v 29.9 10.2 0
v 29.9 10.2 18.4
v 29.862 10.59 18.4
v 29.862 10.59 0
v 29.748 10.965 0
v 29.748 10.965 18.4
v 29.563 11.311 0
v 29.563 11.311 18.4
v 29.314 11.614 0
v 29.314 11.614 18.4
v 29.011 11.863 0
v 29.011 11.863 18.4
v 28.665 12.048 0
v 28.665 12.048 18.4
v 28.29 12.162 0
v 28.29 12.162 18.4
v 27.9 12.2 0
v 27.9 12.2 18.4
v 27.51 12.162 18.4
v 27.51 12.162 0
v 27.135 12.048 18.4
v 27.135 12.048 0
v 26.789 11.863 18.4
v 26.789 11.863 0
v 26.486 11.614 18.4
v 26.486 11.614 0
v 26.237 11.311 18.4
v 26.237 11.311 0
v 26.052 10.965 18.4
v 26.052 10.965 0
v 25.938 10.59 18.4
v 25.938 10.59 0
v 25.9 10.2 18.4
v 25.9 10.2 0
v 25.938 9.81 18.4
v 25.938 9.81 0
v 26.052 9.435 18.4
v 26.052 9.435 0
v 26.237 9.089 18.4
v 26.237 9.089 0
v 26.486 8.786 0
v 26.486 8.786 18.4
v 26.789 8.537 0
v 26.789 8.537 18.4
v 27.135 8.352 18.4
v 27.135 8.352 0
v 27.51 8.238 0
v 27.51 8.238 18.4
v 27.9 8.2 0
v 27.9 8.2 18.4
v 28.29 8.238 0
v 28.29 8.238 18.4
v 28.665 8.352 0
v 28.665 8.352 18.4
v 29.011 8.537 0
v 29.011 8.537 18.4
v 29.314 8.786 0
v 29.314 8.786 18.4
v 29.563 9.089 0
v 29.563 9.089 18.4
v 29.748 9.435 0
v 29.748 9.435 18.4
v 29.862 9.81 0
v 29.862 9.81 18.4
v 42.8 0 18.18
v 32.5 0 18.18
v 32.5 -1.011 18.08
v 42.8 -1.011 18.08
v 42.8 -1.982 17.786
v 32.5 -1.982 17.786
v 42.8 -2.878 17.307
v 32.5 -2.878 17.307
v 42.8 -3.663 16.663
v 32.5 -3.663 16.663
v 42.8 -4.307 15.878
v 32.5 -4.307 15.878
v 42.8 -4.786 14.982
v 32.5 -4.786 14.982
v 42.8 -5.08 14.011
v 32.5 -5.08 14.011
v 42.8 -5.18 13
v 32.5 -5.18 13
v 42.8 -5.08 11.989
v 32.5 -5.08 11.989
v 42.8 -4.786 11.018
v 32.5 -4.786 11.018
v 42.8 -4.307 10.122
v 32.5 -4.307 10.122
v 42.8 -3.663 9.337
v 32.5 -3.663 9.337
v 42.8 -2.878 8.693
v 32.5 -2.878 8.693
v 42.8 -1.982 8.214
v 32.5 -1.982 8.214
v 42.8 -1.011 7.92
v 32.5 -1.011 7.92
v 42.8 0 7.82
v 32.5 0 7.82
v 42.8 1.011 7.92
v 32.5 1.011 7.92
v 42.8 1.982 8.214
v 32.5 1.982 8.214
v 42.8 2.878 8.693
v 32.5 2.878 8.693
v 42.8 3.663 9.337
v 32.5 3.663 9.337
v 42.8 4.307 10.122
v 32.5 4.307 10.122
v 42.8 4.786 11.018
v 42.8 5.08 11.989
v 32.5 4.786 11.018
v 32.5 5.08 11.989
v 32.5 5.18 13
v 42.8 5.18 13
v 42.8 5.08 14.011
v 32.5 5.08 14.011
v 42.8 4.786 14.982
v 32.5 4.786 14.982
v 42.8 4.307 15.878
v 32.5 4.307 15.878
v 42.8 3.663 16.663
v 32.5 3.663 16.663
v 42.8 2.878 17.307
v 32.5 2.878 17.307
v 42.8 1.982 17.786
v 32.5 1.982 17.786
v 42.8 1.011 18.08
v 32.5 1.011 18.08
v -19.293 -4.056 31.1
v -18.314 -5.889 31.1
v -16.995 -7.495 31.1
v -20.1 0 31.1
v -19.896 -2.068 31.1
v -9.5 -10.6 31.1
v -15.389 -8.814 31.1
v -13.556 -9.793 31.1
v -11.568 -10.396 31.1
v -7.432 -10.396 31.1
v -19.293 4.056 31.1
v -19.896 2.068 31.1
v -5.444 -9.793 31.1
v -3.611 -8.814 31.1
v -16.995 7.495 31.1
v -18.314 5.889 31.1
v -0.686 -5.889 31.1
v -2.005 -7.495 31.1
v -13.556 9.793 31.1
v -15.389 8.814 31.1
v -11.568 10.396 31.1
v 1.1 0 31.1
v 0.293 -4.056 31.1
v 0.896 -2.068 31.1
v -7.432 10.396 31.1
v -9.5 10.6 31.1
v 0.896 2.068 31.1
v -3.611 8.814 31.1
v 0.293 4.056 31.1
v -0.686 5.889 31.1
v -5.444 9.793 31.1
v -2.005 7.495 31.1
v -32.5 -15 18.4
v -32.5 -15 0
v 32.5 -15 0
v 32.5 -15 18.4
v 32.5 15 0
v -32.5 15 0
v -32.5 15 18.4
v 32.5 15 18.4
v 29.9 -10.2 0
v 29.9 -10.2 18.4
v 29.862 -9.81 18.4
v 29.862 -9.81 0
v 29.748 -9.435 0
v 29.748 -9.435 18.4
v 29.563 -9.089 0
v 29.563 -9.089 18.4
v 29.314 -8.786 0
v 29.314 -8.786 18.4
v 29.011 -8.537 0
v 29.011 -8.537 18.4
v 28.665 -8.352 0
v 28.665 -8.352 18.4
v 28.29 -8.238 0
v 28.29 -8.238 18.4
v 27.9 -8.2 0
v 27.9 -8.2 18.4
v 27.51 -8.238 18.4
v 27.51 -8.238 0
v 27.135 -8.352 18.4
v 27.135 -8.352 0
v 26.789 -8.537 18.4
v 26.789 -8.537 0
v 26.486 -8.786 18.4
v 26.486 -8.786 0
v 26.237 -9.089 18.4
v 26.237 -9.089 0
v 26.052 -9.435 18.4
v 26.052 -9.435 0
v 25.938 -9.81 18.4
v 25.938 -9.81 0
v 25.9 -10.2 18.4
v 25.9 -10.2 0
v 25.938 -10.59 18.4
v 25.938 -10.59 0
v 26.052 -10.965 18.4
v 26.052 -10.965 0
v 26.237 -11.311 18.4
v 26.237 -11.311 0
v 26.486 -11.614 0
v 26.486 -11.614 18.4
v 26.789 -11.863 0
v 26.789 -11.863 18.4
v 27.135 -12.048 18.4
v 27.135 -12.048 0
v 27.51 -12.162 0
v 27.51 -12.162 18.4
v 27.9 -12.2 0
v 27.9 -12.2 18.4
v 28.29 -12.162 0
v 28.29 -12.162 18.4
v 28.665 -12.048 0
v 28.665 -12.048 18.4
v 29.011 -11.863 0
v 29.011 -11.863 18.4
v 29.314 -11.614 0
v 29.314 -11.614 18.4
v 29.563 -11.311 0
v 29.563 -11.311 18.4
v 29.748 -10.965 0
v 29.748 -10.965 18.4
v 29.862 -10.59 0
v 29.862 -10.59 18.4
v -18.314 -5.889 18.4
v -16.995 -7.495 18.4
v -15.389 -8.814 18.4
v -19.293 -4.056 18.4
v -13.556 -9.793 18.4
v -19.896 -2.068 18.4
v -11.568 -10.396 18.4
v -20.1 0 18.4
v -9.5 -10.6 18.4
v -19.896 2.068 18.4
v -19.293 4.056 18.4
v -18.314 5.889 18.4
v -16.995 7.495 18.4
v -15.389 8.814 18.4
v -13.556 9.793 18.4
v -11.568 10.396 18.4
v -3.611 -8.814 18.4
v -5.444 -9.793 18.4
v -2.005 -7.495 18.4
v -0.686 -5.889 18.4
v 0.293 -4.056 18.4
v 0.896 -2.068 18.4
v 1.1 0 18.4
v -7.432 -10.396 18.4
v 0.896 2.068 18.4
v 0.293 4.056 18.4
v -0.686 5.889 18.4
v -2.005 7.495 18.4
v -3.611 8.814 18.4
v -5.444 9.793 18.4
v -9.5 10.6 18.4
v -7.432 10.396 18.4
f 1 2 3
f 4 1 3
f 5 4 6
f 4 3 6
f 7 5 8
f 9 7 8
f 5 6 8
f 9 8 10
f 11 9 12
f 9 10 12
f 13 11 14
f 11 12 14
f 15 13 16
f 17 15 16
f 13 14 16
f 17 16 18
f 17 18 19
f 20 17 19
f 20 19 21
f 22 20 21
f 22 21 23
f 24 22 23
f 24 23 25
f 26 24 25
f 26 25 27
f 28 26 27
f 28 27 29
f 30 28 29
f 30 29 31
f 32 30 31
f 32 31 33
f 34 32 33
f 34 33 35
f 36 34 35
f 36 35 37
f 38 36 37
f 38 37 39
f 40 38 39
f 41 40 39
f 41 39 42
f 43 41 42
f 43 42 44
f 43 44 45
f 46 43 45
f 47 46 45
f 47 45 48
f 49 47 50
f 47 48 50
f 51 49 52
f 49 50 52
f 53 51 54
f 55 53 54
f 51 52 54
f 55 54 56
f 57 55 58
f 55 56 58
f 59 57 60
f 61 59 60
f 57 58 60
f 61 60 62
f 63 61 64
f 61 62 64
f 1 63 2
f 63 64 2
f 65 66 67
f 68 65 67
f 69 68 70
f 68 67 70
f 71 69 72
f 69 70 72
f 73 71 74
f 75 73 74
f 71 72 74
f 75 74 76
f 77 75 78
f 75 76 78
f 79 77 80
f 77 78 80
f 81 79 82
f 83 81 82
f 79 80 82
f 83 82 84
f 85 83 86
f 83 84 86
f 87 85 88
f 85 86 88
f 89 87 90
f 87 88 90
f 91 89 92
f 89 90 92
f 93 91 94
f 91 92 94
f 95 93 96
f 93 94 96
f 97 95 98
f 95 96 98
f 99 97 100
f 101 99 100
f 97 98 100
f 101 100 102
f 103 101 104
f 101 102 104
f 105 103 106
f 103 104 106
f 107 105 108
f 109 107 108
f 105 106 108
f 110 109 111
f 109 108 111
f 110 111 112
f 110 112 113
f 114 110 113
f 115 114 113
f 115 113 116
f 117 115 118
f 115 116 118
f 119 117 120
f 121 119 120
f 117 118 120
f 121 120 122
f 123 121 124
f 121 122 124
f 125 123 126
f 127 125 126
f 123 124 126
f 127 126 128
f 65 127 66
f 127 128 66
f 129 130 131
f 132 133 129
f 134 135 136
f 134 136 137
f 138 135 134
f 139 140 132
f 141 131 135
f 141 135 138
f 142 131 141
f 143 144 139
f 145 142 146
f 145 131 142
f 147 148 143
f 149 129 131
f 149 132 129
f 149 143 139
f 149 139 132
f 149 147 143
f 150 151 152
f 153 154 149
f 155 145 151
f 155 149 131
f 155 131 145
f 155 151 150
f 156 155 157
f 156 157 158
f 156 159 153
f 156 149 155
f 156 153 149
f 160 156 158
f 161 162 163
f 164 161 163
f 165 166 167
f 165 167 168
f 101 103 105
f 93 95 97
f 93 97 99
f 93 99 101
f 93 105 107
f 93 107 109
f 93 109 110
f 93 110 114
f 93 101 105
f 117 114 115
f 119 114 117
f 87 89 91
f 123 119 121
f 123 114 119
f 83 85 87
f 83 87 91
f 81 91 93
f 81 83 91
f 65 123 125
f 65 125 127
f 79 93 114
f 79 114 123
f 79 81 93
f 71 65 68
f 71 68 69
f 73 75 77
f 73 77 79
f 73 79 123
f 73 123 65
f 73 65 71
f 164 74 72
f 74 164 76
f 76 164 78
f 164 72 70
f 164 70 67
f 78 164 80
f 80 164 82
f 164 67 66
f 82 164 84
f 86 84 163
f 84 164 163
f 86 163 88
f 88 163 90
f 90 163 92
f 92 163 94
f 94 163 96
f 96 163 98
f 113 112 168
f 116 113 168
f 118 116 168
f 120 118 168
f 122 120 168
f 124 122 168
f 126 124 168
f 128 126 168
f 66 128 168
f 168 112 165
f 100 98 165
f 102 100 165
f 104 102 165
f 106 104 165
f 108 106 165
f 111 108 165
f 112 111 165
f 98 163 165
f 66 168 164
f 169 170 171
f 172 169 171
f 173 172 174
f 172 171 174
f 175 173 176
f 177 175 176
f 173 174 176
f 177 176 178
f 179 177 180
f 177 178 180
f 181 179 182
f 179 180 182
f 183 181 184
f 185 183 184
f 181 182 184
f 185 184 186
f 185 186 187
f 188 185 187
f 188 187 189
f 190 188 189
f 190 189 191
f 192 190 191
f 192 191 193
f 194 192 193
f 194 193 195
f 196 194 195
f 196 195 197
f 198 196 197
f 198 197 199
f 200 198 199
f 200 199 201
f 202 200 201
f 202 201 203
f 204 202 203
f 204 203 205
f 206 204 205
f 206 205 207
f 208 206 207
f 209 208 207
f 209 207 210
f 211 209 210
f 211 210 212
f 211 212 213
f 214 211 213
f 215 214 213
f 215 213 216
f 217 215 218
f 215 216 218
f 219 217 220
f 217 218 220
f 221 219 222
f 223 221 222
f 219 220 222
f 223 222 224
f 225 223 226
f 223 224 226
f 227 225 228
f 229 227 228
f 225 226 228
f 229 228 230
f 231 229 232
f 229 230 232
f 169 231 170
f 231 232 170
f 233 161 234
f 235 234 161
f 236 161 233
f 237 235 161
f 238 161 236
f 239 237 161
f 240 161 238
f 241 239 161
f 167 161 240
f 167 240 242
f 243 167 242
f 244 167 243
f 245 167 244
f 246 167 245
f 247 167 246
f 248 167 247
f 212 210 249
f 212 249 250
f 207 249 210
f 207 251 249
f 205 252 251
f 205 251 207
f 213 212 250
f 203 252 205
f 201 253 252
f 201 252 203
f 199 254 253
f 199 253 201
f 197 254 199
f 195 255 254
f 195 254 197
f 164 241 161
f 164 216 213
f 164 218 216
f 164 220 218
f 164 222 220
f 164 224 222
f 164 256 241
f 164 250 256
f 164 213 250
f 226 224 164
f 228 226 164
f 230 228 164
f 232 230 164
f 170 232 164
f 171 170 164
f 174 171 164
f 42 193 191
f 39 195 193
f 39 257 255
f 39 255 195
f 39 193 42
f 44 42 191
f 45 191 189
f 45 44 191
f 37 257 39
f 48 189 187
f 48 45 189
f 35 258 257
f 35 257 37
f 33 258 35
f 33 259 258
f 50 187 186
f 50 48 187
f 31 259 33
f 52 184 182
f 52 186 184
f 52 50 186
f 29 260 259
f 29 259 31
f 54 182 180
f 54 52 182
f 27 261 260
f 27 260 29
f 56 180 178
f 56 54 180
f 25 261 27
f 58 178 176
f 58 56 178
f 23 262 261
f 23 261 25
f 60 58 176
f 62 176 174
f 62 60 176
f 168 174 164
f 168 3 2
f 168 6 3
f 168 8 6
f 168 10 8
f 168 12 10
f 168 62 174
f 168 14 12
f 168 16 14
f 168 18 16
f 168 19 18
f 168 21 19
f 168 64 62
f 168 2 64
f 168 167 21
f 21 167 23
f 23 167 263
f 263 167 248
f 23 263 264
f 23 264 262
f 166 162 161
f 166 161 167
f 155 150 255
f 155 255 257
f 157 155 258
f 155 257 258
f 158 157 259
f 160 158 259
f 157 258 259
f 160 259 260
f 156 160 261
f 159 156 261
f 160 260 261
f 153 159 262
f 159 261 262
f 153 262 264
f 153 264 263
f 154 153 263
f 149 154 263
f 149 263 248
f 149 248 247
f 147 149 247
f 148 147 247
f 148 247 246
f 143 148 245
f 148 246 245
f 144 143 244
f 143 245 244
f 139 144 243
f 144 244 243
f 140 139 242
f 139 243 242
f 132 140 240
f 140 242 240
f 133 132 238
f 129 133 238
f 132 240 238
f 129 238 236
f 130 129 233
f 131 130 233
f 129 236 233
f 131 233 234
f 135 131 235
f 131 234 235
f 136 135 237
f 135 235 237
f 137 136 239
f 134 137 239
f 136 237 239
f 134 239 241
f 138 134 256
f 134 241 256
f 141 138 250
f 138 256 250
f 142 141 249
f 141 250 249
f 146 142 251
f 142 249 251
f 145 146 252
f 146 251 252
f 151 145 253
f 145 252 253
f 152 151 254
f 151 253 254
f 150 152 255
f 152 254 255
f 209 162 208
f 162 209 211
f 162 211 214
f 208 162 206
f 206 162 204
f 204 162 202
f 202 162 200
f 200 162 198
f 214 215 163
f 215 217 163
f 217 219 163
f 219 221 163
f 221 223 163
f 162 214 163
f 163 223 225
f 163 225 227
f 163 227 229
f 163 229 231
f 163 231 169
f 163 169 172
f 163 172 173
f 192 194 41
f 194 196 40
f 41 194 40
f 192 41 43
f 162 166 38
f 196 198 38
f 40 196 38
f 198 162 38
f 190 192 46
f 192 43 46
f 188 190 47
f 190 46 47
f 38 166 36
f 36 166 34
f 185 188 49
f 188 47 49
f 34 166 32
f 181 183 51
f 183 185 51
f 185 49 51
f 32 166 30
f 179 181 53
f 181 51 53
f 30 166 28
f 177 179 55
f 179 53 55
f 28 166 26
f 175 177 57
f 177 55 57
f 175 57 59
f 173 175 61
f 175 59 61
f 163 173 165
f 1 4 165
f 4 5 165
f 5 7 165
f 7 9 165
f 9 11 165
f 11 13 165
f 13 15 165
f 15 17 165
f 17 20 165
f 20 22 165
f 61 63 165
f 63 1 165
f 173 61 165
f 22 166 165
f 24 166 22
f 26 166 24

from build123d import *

# Parameters (mm, degrees)
ESQUISSE1_W             = 65
ESQUISSE1_H             = 30
BOSS_EXTRU_1_DEPTH      = 18.4
ESQUISSE2_R             = 10.6
BOSS_EXTRU_2_DEPTH      = 12.7
ESQUISSE4_R             = 2
ENL_V_MAT_EXTRU_2_DEPTH = 41.246863232
ESQUISSE5_R             = 2
ENL_V_MAT_EXTRU_3_DEPTH = 41.246863232
ESQUISSE6_R             = 5.18
BOSS_EXTRU_3_DEPTH      = 10.3


with BuildPart() as part:
    # Esquisse1 → Boss.-Extru.1 (new body)
    with BuildSketch(Plane.XY):
        Rectangle(ESQUISSE1_W, ESQUISSE1_H)
    extrude(amount=BOSS_EXTRU_1_DEPTH)

    # Esquisse2 → Boss.-Extru.2 (add)
    with BuildSketch(Plane.XY.offset(18.4)):
        with Locations((-9.5, 0)):
            Circle(ESQUISSE2_R)
    extrude(amount=BOSS_EXTRU_2_DEPTH)

    # Esquisse4 → Enlèv. mat.-Extru.2 (cut, through all)
    with BuildSketch(Plane.XY.offset(18.4)):
        with Locations((27.9, -10.2)):
            Circle(ESQUISSE4_R)
    extrude(amount=-ENL_V_MAT_EXTRU_2_DEPTH, mode=Mode.SUBTRACT)

    # Esquisse5 → Enlèv. mat.-Extru.3 (cut, through all)
    with BuildSketch(Plane.XY.offset(18.4)):
        with Locations((27.9, 10.2)):
            Circle(ESQUISSE5_R)
    extrude(amount=-ENL_V_MAT_EXTRU_3_DEPTH, mode=Mode.SUBTRACT)

    # Esquisse6 → Boss.-Extru.3 (add)
    with BuildSketch(Plane(origin=(32.5, 0, 0), x_dir=(0, 0, -1), z_dir=(1, 0, 0))):
        with Locations(Location((-13, 0, 0), (0, 0, 180))):
            Circle(ESQUISSE6_R)
    extrude(amount=BOSS_EXTRU_3_DEPTH)


solid = part.part
